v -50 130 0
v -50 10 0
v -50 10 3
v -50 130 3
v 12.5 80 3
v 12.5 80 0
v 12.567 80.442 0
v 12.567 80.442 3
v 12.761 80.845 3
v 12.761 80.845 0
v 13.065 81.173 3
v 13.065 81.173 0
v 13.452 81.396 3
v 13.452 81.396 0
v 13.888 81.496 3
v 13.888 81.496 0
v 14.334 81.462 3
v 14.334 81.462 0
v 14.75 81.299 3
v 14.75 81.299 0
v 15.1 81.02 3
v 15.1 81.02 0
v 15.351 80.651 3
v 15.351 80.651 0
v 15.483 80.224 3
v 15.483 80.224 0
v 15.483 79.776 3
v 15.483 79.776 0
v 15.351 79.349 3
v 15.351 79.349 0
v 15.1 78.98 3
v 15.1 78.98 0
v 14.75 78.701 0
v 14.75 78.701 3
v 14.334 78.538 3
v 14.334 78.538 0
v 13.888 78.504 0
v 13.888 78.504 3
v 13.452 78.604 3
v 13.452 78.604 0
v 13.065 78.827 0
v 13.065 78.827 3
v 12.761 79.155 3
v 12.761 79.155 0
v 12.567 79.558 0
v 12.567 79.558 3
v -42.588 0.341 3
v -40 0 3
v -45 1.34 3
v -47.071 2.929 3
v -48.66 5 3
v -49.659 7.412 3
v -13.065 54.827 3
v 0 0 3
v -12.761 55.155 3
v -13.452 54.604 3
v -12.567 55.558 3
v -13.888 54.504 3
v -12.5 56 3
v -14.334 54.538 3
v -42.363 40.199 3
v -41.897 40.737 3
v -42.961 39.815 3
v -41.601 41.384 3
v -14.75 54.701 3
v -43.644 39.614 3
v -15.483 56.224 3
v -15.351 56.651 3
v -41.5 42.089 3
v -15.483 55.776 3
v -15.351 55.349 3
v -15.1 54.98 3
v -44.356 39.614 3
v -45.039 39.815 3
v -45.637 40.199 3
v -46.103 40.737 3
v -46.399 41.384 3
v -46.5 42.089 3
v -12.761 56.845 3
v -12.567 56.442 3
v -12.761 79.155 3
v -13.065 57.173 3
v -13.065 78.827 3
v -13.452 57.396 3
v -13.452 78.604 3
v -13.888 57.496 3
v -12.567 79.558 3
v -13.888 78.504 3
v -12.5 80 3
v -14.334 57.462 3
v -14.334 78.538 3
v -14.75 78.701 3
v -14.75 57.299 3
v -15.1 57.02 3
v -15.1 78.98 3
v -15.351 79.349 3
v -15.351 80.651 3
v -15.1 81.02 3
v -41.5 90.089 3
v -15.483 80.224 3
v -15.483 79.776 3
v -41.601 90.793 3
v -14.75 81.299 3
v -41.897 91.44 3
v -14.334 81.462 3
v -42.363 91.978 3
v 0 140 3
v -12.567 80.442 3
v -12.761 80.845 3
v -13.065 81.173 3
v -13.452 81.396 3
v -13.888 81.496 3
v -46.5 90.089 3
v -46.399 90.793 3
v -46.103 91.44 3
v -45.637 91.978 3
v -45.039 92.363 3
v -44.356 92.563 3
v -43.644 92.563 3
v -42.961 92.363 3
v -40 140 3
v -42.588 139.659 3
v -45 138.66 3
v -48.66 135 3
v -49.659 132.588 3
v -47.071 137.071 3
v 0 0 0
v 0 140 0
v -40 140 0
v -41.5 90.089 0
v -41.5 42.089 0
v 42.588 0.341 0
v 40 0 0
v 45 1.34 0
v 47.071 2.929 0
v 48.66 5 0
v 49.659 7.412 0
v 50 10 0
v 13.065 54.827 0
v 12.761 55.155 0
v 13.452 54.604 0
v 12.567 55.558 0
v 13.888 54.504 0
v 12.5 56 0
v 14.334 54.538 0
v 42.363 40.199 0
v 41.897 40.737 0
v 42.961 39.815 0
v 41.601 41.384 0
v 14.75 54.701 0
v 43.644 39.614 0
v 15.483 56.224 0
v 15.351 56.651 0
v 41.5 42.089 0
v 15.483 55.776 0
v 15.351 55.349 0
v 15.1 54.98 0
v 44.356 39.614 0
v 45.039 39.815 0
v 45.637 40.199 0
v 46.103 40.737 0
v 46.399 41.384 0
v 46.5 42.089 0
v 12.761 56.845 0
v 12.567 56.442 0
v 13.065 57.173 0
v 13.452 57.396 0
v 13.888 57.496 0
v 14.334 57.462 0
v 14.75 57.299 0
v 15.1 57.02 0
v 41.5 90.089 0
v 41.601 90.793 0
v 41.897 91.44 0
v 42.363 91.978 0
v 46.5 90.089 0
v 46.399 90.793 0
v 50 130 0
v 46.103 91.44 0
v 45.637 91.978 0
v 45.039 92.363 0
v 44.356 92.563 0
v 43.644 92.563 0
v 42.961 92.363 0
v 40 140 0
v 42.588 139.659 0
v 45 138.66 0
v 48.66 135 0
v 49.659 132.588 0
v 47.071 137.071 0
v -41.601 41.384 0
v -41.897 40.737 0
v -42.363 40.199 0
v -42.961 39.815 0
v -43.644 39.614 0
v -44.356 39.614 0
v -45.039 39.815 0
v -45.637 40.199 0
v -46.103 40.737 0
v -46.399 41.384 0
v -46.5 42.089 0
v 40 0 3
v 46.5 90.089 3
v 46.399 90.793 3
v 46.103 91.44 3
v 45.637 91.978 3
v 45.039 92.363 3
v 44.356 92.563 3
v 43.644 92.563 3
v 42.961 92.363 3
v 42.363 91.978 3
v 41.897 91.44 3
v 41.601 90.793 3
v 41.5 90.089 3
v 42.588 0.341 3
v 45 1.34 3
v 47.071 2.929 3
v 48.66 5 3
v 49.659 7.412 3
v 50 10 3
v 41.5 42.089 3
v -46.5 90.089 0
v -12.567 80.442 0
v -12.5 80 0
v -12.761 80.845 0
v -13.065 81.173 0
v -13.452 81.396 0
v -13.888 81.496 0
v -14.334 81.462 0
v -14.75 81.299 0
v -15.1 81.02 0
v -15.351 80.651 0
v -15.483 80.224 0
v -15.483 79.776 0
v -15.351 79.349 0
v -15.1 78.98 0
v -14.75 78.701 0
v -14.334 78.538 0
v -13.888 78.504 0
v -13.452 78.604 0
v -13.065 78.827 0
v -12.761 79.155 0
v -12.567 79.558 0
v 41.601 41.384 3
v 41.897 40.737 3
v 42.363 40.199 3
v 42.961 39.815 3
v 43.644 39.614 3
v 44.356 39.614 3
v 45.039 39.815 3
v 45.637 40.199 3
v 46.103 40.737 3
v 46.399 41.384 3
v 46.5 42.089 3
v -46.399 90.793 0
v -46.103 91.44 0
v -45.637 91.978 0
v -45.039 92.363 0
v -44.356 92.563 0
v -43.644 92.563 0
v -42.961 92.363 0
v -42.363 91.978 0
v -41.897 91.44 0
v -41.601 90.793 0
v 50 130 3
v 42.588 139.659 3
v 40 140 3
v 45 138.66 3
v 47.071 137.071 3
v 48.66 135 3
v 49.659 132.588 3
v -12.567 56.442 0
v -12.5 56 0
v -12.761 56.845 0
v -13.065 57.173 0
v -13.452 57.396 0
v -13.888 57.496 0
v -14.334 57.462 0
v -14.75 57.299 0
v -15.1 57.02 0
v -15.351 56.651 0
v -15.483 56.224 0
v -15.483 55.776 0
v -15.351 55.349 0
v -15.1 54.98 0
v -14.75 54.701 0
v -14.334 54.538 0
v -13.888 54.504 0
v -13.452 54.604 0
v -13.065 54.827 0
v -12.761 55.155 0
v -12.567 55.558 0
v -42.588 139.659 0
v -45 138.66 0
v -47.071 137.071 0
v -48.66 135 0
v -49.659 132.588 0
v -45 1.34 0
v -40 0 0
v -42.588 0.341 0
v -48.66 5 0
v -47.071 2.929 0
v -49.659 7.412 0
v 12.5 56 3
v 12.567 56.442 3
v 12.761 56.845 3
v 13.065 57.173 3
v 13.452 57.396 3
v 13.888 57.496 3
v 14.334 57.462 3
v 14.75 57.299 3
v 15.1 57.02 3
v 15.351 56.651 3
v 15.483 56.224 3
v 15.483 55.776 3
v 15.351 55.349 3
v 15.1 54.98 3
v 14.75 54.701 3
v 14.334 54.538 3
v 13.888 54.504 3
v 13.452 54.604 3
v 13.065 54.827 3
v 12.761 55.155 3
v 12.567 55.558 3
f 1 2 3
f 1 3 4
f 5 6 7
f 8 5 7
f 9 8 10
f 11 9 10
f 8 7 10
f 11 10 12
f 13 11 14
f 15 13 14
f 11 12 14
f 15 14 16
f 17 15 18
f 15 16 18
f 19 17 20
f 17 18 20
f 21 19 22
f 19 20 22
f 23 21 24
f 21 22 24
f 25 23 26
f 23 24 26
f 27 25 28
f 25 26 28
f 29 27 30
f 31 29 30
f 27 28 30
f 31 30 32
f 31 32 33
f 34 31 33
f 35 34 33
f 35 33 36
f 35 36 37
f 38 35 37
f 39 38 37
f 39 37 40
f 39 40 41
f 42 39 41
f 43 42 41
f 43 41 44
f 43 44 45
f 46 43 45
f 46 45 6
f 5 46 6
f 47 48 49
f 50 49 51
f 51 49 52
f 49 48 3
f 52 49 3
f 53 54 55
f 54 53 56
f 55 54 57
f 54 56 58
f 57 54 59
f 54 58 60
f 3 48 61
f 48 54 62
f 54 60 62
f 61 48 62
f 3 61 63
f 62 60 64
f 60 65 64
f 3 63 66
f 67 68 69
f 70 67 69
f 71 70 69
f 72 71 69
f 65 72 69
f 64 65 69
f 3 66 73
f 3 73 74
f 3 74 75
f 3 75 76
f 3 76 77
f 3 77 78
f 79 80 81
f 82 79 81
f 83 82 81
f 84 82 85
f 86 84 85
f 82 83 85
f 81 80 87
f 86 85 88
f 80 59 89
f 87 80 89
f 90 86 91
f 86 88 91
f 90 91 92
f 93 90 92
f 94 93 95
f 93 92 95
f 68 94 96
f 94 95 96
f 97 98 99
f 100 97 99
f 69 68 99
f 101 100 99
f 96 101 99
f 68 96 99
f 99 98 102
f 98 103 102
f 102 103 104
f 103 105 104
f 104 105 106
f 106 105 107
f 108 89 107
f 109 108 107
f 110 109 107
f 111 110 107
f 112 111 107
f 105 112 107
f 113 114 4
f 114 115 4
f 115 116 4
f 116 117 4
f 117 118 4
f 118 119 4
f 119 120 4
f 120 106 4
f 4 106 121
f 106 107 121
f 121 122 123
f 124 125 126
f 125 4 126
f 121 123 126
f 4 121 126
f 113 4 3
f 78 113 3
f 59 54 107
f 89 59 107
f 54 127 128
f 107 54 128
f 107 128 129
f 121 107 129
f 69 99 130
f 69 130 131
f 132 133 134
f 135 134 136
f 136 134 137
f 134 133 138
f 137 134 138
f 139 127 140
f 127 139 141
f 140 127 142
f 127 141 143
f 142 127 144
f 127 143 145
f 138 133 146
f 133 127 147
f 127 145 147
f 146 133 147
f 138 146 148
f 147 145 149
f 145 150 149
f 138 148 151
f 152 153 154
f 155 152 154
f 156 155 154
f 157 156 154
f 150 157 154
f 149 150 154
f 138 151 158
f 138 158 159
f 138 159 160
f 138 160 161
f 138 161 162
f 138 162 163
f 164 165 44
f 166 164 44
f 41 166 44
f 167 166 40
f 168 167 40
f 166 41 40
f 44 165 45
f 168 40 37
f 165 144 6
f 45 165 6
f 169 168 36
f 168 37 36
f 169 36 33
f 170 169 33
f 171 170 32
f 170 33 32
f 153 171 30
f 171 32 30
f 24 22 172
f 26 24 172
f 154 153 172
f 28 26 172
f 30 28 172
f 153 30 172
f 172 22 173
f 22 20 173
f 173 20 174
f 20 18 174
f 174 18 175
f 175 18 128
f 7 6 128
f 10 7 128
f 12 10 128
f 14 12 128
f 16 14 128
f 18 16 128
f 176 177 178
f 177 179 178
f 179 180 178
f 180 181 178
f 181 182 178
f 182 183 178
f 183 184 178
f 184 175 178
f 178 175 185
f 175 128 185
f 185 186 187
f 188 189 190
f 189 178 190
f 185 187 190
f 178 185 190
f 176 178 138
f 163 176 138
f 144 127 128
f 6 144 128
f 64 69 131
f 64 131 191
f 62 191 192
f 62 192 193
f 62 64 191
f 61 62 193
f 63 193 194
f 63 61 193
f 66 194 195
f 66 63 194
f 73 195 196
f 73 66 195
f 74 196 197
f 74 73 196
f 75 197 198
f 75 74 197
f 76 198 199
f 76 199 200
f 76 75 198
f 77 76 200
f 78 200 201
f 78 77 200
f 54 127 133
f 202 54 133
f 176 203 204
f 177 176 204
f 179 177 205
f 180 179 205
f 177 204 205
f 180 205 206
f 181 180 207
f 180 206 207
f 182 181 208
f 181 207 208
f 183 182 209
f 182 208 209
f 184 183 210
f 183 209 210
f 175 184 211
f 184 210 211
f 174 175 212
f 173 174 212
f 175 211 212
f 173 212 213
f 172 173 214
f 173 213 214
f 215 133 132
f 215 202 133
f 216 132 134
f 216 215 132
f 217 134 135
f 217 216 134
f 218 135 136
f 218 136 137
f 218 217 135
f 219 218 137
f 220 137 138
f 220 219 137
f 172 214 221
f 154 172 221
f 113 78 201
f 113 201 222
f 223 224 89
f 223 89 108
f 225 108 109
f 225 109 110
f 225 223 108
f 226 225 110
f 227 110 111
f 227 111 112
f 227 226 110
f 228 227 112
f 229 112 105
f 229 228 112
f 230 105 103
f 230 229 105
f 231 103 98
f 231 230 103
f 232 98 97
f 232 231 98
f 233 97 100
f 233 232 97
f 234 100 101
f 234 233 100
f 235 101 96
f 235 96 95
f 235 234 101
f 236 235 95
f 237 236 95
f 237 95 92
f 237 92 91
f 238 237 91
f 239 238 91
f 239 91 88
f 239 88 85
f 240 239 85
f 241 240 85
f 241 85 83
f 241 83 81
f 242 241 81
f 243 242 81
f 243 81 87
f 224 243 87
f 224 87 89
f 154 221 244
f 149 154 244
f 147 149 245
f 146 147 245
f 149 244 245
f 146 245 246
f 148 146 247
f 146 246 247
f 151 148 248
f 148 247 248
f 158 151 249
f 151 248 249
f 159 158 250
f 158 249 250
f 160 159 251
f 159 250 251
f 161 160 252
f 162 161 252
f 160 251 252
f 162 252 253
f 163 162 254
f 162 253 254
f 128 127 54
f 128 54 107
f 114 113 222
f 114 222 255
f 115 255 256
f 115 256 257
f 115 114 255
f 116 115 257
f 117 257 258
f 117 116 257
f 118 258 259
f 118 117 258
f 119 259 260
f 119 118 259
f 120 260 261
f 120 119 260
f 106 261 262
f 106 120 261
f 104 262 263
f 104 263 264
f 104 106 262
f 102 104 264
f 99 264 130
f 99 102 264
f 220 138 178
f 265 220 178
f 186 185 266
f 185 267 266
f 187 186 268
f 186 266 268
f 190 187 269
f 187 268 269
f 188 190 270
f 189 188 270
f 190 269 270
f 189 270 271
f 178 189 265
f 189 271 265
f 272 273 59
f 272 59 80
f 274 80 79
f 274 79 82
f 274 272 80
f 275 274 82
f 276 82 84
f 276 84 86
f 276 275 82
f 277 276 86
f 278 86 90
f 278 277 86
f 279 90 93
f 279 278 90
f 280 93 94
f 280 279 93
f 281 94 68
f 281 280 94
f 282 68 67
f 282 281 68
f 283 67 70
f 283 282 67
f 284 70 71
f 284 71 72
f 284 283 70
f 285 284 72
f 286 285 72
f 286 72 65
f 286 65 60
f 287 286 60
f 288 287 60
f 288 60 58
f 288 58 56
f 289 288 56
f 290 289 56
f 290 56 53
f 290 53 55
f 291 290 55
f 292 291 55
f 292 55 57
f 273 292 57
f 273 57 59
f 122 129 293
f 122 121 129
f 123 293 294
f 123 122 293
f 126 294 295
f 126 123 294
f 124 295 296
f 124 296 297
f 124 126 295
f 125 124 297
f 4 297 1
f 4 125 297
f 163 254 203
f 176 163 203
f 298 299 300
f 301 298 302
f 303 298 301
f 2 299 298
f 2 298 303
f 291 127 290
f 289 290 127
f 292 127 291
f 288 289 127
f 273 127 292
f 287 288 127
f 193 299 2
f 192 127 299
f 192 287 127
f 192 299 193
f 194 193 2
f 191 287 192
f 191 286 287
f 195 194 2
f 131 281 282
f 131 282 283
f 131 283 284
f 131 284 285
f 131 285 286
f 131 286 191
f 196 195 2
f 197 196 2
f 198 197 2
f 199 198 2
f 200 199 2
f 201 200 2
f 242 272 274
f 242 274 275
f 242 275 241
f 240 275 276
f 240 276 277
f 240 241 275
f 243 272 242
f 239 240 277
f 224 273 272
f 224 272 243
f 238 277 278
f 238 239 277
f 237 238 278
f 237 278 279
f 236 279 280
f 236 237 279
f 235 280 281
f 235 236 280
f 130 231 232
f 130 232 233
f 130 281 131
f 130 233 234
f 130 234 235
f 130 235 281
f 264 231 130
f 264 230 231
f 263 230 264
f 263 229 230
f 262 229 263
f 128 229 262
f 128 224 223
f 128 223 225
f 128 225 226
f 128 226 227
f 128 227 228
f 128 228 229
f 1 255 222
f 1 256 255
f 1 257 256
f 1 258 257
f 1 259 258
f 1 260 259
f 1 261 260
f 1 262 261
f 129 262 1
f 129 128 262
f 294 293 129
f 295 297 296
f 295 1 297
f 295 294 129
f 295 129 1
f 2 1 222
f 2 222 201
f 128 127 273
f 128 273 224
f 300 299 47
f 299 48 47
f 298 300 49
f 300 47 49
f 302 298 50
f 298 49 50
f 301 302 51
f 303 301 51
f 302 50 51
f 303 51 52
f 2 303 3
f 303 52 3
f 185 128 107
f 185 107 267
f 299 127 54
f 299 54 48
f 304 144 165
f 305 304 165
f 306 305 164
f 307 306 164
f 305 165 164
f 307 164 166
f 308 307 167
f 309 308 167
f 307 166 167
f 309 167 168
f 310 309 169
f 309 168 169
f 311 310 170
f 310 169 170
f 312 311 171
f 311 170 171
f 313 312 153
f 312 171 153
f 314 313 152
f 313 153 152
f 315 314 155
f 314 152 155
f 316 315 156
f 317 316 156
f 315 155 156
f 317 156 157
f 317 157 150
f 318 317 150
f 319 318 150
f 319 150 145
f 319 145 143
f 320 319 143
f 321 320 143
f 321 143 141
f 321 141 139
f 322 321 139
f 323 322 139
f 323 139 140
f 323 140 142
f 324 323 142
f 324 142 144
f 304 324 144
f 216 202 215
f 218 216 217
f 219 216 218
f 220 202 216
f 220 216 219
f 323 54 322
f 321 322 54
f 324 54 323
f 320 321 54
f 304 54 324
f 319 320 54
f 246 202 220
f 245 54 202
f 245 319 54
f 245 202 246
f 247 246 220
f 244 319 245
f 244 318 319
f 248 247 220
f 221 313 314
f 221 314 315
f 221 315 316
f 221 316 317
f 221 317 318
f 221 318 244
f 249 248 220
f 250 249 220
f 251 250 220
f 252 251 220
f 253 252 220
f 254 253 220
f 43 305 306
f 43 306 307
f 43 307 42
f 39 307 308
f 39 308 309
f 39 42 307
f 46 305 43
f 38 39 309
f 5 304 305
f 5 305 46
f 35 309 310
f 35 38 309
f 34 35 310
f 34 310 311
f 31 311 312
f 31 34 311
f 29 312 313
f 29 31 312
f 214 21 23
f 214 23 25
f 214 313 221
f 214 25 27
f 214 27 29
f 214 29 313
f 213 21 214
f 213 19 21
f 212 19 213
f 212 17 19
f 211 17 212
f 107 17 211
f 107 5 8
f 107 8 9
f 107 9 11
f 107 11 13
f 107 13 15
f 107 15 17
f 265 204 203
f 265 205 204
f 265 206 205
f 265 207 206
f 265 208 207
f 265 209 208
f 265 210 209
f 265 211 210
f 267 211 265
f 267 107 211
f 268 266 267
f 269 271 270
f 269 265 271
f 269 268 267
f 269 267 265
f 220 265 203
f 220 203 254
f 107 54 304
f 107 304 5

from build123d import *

# Parameters (mm, degrees)
F1_W     = 50
F1_H     = 140
F2_DEPTH = 3
F4_D     = 3
F7_DEPTH = 40.836263
F8_R     = 10


with BuildPart() as f2:
    # F1 (on face) → F2 (new body)
    with BuildSketch(Plane.XY):
        with Locations((25, 70)):
            Rectangle(F1_W, F1_H)
    extrude(amount=F2_DEPTH)

    # F4 (through all)
    with Locations(Plane.XY.offset(3)):
        with Locations((14, 80), (14, 56)):
            Hole(F4_D / 2)

    # F6 (on face) → F7 (cut)
    with BuildSketch(Plane.XY.offset(3)):
        with BuildLine():
            ThreePointArc((46.5, 90.088687), (44, 92.588687), (41.5, 90.088687))
            Line((41.5, 90.088687), (41.5, 42.088687))
            ThreePointArc((41.5, 42.088687), (44, 39.588687), (46.5, 42.088687))
            Line((46.5, 42.088687), (46.5, 90.088687))
        make_face()
    extrude(amount=-F7_DEPTH, mode=Mode.SUBTRACT)

    # F8
    f8_edges = [f2.edges().sort_by_distance(p)[0] for p in [
        (50, 140, 1.5),
        (50, 0, 1.5),
    ]]
    fillet(f8_edges, radius=F8_R)


with BuildPart() as f9_1:
    # F9: instance of F2
    add(f2.part.mirror(Plane.YZ))


solid = Compound([f2.part, f9_1.part])
